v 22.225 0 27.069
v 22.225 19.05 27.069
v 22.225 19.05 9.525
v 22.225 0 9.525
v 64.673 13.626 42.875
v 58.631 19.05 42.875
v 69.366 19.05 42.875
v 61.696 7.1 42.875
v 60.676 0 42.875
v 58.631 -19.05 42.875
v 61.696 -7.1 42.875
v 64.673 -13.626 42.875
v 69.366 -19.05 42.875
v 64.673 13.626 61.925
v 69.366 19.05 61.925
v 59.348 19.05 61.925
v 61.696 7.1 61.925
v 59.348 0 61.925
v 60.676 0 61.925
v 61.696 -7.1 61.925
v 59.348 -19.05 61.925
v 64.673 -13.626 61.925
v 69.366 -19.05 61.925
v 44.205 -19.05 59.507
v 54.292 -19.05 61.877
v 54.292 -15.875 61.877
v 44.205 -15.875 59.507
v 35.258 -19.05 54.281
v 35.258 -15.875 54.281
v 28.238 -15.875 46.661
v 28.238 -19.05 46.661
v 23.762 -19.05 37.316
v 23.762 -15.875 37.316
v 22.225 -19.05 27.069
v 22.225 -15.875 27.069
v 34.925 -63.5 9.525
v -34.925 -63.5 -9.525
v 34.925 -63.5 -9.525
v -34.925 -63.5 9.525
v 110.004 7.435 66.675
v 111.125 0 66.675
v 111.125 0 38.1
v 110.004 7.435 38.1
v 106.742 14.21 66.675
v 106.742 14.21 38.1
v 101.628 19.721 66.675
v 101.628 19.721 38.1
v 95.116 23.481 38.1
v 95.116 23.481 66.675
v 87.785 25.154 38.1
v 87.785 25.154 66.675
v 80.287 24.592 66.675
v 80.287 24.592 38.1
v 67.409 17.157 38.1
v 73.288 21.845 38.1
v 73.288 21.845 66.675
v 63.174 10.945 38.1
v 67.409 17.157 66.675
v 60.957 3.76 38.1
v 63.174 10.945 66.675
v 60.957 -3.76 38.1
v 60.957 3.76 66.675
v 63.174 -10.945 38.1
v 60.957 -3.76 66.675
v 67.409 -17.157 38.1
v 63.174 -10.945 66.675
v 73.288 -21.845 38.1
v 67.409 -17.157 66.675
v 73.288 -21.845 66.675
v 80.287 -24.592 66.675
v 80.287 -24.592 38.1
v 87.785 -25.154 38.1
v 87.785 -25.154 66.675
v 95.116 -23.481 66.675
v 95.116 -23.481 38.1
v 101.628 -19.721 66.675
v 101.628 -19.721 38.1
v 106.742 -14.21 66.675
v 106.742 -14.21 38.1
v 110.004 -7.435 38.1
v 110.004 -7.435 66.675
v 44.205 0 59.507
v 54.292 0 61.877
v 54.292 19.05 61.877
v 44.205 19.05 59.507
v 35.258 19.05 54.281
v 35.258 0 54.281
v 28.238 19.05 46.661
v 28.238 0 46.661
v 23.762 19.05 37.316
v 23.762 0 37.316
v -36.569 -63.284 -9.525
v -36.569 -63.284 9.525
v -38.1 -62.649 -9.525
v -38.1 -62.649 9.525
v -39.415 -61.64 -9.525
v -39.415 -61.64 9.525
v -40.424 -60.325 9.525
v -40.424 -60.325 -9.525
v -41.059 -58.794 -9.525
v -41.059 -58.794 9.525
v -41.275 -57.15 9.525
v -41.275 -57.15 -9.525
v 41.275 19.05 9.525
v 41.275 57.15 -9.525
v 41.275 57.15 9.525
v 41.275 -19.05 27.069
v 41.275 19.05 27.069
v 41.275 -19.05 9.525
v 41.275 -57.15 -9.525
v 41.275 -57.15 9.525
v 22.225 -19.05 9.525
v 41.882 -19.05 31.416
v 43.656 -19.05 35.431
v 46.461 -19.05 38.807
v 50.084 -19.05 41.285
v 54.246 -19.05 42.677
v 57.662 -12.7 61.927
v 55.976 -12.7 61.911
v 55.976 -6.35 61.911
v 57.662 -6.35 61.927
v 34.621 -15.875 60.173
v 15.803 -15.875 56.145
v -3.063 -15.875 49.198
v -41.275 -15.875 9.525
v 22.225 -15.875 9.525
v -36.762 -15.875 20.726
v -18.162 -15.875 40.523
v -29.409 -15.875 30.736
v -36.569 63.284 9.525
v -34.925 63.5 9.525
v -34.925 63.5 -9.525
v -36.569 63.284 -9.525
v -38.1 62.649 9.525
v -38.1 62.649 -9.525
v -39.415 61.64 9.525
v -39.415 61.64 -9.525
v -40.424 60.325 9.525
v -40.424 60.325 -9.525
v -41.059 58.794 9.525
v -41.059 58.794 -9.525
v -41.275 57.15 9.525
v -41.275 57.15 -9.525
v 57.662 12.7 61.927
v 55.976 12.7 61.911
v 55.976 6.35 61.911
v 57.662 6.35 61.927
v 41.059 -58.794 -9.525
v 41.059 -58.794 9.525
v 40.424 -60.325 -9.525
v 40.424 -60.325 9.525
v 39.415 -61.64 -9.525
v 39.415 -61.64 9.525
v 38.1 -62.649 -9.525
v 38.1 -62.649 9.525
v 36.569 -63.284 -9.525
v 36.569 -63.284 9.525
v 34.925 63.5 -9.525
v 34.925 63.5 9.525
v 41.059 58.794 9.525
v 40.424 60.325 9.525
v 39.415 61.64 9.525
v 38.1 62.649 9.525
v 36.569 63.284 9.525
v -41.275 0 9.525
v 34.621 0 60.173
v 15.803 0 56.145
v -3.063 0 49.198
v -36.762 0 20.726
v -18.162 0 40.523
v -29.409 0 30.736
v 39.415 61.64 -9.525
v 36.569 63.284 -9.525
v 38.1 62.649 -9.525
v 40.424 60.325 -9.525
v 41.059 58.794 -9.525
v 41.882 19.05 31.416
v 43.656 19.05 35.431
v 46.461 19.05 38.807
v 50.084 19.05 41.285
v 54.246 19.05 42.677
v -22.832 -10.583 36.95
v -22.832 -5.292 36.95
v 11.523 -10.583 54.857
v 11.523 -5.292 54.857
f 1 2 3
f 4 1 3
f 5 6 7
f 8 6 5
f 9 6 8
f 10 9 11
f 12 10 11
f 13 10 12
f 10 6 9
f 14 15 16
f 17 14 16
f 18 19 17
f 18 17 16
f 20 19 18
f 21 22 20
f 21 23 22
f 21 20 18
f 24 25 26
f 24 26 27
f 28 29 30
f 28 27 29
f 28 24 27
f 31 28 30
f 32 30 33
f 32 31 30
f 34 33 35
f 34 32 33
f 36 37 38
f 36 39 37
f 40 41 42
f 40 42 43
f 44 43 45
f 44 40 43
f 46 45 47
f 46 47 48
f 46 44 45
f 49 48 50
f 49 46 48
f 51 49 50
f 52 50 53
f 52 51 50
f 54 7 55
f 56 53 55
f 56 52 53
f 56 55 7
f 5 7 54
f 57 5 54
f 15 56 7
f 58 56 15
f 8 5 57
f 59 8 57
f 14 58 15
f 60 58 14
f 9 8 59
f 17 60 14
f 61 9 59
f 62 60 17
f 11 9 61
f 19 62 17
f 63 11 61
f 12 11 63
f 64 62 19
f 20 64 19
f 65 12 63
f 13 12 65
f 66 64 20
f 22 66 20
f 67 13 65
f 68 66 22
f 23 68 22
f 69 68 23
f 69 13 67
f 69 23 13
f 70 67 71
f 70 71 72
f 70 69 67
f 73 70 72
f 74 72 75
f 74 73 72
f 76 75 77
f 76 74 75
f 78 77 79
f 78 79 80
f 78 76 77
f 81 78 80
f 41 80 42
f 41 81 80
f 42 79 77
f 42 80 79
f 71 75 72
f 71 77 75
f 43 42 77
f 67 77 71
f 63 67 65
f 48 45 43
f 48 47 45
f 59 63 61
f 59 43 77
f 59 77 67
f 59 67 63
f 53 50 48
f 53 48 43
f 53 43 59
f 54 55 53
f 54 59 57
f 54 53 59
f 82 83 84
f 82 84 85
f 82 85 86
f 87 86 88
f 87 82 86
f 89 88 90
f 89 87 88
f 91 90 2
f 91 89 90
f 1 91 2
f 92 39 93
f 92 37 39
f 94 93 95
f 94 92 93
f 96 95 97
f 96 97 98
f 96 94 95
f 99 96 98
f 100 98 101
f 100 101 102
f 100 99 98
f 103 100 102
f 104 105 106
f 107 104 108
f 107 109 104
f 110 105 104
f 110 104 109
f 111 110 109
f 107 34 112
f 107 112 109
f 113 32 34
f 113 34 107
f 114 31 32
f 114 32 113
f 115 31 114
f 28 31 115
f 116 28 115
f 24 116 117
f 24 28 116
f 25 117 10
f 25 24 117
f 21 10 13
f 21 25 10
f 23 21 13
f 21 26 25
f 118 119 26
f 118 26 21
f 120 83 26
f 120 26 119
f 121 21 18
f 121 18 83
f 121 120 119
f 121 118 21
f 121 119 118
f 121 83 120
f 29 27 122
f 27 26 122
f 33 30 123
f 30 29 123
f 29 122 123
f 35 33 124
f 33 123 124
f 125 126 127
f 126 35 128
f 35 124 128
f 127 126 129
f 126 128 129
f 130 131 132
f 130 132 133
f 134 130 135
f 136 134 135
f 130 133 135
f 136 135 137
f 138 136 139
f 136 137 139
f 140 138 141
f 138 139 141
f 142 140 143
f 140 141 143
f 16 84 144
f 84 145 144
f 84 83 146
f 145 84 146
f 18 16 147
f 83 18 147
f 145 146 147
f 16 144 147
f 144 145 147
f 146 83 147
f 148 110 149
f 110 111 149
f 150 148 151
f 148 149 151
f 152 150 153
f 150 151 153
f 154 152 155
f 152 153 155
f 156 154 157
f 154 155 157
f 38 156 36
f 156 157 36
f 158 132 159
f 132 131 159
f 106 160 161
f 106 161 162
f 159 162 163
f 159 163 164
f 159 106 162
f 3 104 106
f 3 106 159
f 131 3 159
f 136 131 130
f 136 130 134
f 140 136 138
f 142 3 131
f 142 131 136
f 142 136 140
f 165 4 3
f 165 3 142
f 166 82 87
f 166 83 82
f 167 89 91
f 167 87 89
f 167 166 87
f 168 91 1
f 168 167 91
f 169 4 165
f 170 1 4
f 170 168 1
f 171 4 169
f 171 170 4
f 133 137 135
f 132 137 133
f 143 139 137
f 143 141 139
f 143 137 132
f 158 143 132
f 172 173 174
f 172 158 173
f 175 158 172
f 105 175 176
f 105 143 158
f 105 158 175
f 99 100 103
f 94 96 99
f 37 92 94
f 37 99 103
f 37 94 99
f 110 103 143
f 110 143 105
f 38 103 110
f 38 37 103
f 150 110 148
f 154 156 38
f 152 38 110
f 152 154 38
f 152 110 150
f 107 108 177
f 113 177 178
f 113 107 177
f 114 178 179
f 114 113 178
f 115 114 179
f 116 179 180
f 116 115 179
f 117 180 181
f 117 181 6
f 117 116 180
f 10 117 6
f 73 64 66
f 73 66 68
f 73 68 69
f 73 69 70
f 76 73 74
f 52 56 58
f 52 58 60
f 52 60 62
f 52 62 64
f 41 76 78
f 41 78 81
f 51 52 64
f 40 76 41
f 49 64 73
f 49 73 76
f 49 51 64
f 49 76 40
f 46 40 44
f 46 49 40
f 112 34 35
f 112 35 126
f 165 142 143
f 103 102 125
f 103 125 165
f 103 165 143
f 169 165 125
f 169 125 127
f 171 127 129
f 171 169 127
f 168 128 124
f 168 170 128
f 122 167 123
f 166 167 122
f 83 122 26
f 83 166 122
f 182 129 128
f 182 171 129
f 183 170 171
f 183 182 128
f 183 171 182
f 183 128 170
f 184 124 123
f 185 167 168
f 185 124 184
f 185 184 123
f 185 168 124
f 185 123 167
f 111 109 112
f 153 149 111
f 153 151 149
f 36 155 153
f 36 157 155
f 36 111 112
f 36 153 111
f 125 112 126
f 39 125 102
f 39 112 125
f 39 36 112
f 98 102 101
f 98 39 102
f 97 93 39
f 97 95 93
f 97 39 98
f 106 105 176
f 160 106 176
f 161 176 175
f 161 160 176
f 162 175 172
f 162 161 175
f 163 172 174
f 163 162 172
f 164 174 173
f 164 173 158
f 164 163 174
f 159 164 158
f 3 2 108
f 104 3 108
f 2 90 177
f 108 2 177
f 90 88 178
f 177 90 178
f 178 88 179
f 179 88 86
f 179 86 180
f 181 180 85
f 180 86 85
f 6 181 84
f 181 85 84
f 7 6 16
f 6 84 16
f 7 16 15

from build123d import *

# Parameters (mm, degrees)
F1_DEPTH = 63.5
F0_W     = 25.5753439546
F0_H     = 19.05
F2_DEPTH = 19.05
F3_DEPTH = 15.875
F5_R     = 6.35


with BuildPart() as f1:
    # F0 (on Front) → F1 (new body, symmetric)
    with BuildSketch(Plane.XZ):
        Polygon((-41.275, -9.525), (41.275, -9.525), (41.275, 9.525), (22.225, 9.525), (-41.275, 9.525), align=None)
    extrude(amount=F1_DEPTH, both=True)

    # F0 (on Front) → F2 (join, symmetric)
    with BuildSketch(Plane.XZ):
        with BuildLine():
            Line((22.225, 9.525), (41.275, 9.525))
            Line((41.275, 9.525), (41.275, 27.0694342772))
            ThreePointArc((41.275, 27.0694342772), (46.461113991, 38.8066971986), (58.6310114503, 42.8752))
            Line((58.6310114503, 42.8752), (60.325, 42.8752))
            Line((60.325, 42.8752), (60.325, 61.9252))
            Line((60.325, 61.9252), (59.3480038392, 61.9252))
            add(Edge.make_bspline(
                [(54.2917304748, 61.8772770762), (55.9757916155, 61.9197178462), (57.6618264754, 61.9358036226), (59.3480038392, 61.9252)],
                knots=[109.3105529677, 109.3105529677, 109.3105529677, 109.3105529677, 113.4494154311, 113.4494154311, 113.4494154311, 113.4494154311], degree=3))
            ThreePointArc((54.2917304748, 61.8772770762), (31.4636155895, 50.7330198237), (22.225, 27.0694342772))
            Line((22.225, 27.0694342772), (22.225, 9.525))
        make_face()
        with Locations((73.1126719773, 52.4002)):
            Rectangle(F0_W, F0_H)
    extrude(amount=F2_DEPTH, both=True)

    # F0 (on Front) → F3 (join)
    with BuildSketch(Plane.XZ):
        with BuildLine():
            add(Edge.make_bspline(
                [(-41.275, 9.525), (-33.2862530849, 41.2521209724), (9.8143756106, 60.7563835758), (54.2917304748, 61.8772770762)],
                knots=[0, 0, 0, 0, 109.3105529677, 109.3105529677, 109.3105529677, 109.3105529677], degree=3))
            Line((-41.275, 9.525), (22.225, 9.525))
            Line((22.225, 9.525), (22.225, 27.0694342772))
            ThreePointArc((22.225, 27.0694342772), (31.4636155895, 50.7330198237), (54.2917304748, 61.8772770762))
        make_face()
    extrude(amount=F3_DEPTH)

    # F0 (on Front) → F4 (revolve)
    with BuildSketch(Plane.XZ):
        Polygon((85.9003439546, 61.9252), (85.9003439546, 42.8752), (85.9003439546, 38.1), (111.125, 38.1), (111.125, 66.675), (85.9003439546, 66.675), align=None)
    revolve(axis=Axis((85.9003439546, 0, 52.3875), (0, 0, 1)))

    # F5
    f5_edges = [f1.edges().sort_by_distance(p)[0] for p in [
        (-41.275, -63.5, 0),
        (41.275, -63.5, 0),
        (41.275, 63.5, 0),
        (-41.275, 63.5, 0),
    ]]
    fillet(f5_edges, radius=F5_R)


solid = f1.part
